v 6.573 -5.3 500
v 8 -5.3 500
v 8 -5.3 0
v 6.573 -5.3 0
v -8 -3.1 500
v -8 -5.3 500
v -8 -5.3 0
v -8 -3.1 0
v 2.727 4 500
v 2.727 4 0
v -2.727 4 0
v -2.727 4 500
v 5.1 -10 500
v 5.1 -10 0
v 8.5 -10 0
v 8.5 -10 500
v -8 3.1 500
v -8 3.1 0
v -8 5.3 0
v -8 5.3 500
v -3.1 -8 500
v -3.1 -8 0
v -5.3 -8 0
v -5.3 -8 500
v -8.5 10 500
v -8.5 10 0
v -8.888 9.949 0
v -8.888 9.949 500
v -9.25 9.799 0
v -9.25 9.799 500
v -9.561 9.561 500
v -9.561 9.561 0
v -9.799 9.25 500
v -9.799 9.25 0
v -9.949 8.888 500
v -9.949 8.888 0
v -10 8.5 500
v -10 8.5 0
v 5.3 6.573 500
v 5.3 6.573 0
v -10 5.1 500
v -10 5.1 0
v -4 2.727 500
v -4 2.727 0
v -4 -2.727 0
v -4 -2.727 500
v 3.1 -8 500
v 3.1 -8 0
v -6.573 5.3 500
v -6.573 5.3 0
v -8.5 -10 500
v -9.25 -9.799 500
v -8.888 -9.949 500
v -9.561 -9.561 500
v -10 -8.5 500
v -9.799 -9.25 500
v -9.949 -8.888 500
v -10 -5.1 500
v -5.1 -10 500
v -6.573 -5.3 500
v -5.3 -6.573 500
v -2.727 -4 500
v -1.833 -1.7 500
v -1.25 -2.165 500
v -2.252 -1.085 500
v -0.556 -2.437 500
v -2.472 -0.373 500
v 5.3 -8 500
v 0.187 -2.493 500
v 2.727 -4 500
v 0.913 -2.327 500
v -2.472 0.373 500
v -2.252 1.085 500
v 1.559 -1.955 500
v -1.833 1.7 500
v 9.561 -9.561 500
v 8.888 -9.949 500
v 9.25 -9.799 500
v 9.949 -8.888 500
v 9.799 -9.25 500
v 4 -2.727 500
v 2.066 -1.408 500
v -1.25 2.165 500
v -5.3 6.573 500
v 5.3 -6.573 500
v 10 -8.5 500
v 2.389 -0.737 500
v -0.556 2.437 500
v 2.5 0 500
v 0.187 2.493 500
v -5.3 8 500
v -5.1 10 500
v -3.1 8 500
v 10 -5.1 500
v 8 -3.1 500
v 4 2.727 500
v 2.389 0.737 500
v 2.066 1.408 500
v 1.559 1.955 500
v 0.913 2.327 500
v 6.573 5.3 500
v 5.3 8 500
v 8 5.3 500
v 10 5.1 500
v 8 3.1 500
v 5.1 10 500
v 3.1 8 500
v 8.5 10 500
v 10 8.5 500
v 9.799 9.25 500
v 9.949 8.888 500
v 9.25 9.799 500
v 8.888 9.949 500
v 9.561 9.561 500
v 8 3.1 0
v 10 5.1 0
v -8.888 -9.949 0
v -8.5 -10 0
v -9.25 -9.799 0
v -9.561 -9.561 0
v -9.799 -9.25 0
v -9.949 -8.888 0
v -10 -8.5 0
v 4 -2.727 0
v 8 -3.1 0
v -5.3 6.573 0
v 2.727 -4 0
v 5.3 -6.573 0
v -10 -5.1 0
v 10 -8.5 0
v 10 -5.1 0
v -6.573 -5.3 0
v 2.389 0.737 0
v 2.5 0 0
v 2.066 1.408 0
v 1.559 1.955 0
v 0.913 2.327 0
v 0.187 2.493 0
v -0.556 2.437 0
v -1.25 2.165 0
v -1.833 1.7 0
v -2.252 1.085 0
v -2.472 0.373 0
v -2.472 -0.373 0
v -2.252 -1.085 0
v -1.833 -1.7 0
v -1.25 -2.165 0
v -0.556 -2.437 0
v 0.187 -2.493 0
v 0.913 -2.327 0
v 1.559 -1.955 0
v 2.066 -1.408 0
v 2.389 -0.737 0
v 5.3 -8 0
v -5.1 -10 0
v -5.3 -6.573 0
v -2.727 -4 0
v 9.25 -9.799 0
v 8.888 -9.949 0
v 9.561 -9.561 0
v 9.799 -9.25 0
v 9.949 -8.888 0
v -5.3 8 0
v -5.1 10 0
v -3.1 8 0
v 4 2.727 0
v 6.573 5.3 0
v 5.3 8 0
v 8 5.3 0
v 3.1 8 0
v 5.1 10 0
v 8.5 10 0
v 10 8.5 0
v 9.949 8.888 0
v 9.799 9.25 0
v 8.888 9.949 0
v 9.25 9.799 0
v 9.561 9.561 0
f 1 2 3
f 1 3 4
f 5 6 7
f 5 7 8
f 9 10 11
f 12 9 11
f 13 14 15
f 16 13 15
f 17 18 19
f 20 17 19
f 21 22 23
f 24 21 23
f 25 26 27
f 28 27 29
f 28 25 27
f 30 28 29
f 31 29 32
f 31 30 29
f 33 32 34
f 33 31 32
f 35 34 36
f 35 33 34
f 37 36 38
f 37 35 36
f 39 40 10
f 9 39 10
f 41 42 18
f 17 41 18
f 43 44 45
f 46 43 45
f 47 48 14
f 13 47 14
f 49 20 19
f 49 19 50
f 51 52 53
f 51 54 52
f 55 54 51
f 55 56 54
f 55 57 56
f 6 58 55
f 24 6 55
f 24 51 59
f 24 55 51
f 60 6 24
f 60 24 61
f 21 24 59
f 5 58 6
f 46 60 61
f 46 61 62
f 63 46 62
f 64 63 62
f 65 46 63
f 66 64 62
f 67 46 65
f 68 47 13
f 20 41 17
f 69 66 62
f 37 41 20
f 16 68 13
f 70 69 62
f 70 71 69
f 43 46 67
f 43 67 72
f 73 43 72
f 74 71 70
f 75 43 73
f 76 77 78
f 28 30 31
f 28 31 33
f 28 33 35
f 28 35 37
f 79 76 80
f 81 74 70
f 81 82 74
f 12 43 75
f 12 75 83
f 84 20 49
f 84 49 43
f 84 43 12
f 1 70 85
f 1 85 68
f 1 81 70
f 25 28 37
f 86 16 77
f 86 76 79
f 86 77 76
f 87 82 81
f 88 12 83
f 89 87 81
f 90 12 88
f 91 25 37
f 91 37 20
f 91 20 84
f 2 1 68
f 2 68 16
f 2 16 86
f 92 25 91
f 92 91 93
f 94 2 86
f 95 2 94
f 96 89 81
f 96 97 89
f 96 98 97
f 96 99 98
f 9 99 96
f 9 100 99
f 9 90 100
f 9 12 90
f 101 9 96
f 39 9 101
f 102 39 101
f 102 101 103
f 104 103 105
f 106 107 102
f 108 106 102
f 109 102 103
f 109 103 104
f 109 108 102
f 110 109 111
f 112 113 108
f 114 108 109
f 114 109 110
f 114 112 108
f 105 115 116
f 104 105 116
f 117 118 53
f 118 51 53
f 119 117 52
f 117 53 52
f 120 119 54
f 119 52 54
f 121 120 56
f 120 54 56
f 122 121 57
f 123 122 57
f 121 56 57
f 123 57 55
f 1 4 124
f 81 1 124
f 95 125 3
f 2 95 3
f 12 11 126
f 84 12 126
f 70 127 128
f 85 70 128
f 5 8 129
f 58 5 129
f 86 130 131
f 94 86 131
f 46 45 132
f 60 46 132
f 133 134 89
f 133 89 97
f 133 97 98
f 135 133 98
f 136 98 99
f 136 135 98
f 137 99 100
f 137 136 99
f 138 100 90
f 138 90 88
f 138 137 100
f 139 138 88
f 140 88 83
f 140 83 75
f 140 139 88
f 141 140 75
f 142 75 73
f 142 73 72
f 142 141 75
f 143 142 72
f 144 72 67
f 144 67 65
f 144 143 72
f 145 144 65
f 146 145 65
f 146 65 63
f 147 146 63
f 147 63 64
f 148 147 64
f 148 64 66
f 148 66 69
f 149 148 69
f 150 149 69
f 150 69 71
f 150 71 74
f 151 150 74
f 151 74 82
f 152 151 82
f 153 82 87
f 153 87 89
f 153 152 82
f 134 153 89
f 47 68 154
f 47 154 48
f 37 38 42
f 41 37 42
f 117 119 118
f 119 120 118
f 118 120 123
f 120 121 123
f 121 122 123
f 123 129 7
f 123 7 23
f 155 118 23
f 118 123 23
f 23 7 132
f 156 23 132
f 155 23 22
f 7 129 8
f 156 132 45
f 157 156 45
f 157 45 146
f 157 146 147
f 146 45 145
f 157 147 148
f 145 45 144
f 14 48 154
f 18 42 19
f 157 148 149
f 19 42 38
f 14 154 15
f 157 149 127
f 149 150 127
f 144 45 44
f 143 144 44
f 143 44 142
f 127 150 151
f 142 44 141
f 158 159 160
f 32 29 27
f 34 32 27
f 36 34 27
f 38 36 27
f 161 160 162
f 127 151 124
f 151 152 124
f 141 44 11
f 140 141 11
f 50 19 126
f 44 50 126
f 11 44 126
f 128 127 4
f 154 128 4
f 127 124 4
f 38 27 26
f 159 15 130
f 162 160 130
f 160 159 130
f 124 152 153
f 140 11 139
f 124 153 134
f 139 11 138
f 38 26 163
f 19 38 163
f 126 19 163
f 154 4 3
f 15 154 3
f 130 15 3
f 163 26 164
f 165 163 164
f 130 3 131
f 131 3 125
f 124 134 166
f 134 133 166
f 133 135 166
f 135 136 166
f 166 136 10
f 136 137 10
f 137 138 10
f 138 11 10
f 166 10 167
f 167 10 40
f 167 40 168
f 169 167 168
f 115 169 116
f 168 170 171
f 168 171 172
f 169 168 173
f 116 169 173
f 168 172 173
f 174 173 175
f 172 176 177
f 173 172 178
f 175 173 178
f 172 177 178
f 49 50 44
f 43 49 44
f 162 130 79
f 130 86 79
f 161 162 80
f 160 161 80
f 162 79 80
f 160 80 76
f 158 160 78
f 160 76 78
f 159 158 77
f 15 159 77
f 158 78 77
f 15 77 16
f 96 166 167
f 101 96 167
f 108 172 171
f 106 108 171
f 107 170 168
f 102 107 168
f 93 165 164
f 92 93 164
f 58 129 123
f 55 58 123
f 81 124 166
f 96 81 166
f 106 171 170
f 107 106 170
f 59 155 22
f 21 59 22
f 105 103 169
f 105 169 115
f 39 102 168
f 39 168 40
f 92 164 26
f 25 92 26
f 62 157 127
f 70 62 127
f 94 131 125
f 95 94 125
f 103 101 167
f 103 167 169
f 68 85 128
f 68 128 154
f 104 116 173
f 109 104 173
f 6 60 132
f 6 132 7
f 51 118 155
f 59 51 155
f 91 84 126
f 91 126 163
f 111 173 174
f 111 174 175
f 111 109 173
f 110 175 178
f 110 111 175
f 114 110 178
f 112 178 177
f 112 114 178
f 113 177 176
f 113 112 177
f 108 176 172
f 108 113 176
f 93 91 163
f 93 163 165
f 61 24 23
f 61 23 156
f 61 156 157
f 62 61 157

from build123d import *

# Parameters (mm, degrees)
EXTRUDE_1_OUTLINE_R = 2.5
EXTRUDE_1_DEPTH     = 500
FILLET_1_R          = 1.5


# Read off the part's stored shape, not the designer's step: Бобышка-Вытянуть1
with BuildPart() as part:
    # Бобышка-Вытянуть1 outline → Бобышка-Вытянуть1 (new body)
    with BuildSketch(Plane.XY):
        Polygon((4, 2.727207794), (6.572792206, 5.3), (8, 5.3), (8, 3.1), (10, 5.1), (10, 10), (5.1, 10), (3.1, 8), (5.3, 8), (5.3, 6.572792206), (2.727207794, 4), (-2.727207794, 4), (-5.3, 6.572792206), (-5.3, 8), (-3.1, 8), (-5.1, 10), (-10, 10), (-10, 5.1), (-8, 3.1), (-8, 5.3), (-6.572792206, 5.3), (-4, 2.727207794), (-4, -2.727207794), (-6.572792206, -5.3), (-8, -5.3), (-8, -3.1), (-10, -5.1), (-10, -10), (-5.1, -10), (-3.1, -8), (-5.3, -8), (-5.3, -6.572792206), (-2.727207794, -4), (2.727207794, -4), (5.3, -6.572792206), (5.3, -8), (3.1, -8), (5.1, -10), (10, -10), (10, -5.1), (8, -3.1), (8, -5.3), (6.572792206, -5.3), (4, -2.727207794), align=None)
        Circle(EXTRUDE_1_OUTLINE_R, mode=Mode.SUBTRACT)
    extrude(amount=EXTRUDE_1_DEPTH)

    # Скругление1
    fillet_1_edges = [part.edges().sort_by_distance(p)[0] for p in [
        (10, -10, 250),
        (-10, -10, 250),
        (-10, 10, 250),
        (10, 10, 250),
    ]]
    fillet(fillet_1_edges, radius=FILLET_1_R)


solid = part.part
